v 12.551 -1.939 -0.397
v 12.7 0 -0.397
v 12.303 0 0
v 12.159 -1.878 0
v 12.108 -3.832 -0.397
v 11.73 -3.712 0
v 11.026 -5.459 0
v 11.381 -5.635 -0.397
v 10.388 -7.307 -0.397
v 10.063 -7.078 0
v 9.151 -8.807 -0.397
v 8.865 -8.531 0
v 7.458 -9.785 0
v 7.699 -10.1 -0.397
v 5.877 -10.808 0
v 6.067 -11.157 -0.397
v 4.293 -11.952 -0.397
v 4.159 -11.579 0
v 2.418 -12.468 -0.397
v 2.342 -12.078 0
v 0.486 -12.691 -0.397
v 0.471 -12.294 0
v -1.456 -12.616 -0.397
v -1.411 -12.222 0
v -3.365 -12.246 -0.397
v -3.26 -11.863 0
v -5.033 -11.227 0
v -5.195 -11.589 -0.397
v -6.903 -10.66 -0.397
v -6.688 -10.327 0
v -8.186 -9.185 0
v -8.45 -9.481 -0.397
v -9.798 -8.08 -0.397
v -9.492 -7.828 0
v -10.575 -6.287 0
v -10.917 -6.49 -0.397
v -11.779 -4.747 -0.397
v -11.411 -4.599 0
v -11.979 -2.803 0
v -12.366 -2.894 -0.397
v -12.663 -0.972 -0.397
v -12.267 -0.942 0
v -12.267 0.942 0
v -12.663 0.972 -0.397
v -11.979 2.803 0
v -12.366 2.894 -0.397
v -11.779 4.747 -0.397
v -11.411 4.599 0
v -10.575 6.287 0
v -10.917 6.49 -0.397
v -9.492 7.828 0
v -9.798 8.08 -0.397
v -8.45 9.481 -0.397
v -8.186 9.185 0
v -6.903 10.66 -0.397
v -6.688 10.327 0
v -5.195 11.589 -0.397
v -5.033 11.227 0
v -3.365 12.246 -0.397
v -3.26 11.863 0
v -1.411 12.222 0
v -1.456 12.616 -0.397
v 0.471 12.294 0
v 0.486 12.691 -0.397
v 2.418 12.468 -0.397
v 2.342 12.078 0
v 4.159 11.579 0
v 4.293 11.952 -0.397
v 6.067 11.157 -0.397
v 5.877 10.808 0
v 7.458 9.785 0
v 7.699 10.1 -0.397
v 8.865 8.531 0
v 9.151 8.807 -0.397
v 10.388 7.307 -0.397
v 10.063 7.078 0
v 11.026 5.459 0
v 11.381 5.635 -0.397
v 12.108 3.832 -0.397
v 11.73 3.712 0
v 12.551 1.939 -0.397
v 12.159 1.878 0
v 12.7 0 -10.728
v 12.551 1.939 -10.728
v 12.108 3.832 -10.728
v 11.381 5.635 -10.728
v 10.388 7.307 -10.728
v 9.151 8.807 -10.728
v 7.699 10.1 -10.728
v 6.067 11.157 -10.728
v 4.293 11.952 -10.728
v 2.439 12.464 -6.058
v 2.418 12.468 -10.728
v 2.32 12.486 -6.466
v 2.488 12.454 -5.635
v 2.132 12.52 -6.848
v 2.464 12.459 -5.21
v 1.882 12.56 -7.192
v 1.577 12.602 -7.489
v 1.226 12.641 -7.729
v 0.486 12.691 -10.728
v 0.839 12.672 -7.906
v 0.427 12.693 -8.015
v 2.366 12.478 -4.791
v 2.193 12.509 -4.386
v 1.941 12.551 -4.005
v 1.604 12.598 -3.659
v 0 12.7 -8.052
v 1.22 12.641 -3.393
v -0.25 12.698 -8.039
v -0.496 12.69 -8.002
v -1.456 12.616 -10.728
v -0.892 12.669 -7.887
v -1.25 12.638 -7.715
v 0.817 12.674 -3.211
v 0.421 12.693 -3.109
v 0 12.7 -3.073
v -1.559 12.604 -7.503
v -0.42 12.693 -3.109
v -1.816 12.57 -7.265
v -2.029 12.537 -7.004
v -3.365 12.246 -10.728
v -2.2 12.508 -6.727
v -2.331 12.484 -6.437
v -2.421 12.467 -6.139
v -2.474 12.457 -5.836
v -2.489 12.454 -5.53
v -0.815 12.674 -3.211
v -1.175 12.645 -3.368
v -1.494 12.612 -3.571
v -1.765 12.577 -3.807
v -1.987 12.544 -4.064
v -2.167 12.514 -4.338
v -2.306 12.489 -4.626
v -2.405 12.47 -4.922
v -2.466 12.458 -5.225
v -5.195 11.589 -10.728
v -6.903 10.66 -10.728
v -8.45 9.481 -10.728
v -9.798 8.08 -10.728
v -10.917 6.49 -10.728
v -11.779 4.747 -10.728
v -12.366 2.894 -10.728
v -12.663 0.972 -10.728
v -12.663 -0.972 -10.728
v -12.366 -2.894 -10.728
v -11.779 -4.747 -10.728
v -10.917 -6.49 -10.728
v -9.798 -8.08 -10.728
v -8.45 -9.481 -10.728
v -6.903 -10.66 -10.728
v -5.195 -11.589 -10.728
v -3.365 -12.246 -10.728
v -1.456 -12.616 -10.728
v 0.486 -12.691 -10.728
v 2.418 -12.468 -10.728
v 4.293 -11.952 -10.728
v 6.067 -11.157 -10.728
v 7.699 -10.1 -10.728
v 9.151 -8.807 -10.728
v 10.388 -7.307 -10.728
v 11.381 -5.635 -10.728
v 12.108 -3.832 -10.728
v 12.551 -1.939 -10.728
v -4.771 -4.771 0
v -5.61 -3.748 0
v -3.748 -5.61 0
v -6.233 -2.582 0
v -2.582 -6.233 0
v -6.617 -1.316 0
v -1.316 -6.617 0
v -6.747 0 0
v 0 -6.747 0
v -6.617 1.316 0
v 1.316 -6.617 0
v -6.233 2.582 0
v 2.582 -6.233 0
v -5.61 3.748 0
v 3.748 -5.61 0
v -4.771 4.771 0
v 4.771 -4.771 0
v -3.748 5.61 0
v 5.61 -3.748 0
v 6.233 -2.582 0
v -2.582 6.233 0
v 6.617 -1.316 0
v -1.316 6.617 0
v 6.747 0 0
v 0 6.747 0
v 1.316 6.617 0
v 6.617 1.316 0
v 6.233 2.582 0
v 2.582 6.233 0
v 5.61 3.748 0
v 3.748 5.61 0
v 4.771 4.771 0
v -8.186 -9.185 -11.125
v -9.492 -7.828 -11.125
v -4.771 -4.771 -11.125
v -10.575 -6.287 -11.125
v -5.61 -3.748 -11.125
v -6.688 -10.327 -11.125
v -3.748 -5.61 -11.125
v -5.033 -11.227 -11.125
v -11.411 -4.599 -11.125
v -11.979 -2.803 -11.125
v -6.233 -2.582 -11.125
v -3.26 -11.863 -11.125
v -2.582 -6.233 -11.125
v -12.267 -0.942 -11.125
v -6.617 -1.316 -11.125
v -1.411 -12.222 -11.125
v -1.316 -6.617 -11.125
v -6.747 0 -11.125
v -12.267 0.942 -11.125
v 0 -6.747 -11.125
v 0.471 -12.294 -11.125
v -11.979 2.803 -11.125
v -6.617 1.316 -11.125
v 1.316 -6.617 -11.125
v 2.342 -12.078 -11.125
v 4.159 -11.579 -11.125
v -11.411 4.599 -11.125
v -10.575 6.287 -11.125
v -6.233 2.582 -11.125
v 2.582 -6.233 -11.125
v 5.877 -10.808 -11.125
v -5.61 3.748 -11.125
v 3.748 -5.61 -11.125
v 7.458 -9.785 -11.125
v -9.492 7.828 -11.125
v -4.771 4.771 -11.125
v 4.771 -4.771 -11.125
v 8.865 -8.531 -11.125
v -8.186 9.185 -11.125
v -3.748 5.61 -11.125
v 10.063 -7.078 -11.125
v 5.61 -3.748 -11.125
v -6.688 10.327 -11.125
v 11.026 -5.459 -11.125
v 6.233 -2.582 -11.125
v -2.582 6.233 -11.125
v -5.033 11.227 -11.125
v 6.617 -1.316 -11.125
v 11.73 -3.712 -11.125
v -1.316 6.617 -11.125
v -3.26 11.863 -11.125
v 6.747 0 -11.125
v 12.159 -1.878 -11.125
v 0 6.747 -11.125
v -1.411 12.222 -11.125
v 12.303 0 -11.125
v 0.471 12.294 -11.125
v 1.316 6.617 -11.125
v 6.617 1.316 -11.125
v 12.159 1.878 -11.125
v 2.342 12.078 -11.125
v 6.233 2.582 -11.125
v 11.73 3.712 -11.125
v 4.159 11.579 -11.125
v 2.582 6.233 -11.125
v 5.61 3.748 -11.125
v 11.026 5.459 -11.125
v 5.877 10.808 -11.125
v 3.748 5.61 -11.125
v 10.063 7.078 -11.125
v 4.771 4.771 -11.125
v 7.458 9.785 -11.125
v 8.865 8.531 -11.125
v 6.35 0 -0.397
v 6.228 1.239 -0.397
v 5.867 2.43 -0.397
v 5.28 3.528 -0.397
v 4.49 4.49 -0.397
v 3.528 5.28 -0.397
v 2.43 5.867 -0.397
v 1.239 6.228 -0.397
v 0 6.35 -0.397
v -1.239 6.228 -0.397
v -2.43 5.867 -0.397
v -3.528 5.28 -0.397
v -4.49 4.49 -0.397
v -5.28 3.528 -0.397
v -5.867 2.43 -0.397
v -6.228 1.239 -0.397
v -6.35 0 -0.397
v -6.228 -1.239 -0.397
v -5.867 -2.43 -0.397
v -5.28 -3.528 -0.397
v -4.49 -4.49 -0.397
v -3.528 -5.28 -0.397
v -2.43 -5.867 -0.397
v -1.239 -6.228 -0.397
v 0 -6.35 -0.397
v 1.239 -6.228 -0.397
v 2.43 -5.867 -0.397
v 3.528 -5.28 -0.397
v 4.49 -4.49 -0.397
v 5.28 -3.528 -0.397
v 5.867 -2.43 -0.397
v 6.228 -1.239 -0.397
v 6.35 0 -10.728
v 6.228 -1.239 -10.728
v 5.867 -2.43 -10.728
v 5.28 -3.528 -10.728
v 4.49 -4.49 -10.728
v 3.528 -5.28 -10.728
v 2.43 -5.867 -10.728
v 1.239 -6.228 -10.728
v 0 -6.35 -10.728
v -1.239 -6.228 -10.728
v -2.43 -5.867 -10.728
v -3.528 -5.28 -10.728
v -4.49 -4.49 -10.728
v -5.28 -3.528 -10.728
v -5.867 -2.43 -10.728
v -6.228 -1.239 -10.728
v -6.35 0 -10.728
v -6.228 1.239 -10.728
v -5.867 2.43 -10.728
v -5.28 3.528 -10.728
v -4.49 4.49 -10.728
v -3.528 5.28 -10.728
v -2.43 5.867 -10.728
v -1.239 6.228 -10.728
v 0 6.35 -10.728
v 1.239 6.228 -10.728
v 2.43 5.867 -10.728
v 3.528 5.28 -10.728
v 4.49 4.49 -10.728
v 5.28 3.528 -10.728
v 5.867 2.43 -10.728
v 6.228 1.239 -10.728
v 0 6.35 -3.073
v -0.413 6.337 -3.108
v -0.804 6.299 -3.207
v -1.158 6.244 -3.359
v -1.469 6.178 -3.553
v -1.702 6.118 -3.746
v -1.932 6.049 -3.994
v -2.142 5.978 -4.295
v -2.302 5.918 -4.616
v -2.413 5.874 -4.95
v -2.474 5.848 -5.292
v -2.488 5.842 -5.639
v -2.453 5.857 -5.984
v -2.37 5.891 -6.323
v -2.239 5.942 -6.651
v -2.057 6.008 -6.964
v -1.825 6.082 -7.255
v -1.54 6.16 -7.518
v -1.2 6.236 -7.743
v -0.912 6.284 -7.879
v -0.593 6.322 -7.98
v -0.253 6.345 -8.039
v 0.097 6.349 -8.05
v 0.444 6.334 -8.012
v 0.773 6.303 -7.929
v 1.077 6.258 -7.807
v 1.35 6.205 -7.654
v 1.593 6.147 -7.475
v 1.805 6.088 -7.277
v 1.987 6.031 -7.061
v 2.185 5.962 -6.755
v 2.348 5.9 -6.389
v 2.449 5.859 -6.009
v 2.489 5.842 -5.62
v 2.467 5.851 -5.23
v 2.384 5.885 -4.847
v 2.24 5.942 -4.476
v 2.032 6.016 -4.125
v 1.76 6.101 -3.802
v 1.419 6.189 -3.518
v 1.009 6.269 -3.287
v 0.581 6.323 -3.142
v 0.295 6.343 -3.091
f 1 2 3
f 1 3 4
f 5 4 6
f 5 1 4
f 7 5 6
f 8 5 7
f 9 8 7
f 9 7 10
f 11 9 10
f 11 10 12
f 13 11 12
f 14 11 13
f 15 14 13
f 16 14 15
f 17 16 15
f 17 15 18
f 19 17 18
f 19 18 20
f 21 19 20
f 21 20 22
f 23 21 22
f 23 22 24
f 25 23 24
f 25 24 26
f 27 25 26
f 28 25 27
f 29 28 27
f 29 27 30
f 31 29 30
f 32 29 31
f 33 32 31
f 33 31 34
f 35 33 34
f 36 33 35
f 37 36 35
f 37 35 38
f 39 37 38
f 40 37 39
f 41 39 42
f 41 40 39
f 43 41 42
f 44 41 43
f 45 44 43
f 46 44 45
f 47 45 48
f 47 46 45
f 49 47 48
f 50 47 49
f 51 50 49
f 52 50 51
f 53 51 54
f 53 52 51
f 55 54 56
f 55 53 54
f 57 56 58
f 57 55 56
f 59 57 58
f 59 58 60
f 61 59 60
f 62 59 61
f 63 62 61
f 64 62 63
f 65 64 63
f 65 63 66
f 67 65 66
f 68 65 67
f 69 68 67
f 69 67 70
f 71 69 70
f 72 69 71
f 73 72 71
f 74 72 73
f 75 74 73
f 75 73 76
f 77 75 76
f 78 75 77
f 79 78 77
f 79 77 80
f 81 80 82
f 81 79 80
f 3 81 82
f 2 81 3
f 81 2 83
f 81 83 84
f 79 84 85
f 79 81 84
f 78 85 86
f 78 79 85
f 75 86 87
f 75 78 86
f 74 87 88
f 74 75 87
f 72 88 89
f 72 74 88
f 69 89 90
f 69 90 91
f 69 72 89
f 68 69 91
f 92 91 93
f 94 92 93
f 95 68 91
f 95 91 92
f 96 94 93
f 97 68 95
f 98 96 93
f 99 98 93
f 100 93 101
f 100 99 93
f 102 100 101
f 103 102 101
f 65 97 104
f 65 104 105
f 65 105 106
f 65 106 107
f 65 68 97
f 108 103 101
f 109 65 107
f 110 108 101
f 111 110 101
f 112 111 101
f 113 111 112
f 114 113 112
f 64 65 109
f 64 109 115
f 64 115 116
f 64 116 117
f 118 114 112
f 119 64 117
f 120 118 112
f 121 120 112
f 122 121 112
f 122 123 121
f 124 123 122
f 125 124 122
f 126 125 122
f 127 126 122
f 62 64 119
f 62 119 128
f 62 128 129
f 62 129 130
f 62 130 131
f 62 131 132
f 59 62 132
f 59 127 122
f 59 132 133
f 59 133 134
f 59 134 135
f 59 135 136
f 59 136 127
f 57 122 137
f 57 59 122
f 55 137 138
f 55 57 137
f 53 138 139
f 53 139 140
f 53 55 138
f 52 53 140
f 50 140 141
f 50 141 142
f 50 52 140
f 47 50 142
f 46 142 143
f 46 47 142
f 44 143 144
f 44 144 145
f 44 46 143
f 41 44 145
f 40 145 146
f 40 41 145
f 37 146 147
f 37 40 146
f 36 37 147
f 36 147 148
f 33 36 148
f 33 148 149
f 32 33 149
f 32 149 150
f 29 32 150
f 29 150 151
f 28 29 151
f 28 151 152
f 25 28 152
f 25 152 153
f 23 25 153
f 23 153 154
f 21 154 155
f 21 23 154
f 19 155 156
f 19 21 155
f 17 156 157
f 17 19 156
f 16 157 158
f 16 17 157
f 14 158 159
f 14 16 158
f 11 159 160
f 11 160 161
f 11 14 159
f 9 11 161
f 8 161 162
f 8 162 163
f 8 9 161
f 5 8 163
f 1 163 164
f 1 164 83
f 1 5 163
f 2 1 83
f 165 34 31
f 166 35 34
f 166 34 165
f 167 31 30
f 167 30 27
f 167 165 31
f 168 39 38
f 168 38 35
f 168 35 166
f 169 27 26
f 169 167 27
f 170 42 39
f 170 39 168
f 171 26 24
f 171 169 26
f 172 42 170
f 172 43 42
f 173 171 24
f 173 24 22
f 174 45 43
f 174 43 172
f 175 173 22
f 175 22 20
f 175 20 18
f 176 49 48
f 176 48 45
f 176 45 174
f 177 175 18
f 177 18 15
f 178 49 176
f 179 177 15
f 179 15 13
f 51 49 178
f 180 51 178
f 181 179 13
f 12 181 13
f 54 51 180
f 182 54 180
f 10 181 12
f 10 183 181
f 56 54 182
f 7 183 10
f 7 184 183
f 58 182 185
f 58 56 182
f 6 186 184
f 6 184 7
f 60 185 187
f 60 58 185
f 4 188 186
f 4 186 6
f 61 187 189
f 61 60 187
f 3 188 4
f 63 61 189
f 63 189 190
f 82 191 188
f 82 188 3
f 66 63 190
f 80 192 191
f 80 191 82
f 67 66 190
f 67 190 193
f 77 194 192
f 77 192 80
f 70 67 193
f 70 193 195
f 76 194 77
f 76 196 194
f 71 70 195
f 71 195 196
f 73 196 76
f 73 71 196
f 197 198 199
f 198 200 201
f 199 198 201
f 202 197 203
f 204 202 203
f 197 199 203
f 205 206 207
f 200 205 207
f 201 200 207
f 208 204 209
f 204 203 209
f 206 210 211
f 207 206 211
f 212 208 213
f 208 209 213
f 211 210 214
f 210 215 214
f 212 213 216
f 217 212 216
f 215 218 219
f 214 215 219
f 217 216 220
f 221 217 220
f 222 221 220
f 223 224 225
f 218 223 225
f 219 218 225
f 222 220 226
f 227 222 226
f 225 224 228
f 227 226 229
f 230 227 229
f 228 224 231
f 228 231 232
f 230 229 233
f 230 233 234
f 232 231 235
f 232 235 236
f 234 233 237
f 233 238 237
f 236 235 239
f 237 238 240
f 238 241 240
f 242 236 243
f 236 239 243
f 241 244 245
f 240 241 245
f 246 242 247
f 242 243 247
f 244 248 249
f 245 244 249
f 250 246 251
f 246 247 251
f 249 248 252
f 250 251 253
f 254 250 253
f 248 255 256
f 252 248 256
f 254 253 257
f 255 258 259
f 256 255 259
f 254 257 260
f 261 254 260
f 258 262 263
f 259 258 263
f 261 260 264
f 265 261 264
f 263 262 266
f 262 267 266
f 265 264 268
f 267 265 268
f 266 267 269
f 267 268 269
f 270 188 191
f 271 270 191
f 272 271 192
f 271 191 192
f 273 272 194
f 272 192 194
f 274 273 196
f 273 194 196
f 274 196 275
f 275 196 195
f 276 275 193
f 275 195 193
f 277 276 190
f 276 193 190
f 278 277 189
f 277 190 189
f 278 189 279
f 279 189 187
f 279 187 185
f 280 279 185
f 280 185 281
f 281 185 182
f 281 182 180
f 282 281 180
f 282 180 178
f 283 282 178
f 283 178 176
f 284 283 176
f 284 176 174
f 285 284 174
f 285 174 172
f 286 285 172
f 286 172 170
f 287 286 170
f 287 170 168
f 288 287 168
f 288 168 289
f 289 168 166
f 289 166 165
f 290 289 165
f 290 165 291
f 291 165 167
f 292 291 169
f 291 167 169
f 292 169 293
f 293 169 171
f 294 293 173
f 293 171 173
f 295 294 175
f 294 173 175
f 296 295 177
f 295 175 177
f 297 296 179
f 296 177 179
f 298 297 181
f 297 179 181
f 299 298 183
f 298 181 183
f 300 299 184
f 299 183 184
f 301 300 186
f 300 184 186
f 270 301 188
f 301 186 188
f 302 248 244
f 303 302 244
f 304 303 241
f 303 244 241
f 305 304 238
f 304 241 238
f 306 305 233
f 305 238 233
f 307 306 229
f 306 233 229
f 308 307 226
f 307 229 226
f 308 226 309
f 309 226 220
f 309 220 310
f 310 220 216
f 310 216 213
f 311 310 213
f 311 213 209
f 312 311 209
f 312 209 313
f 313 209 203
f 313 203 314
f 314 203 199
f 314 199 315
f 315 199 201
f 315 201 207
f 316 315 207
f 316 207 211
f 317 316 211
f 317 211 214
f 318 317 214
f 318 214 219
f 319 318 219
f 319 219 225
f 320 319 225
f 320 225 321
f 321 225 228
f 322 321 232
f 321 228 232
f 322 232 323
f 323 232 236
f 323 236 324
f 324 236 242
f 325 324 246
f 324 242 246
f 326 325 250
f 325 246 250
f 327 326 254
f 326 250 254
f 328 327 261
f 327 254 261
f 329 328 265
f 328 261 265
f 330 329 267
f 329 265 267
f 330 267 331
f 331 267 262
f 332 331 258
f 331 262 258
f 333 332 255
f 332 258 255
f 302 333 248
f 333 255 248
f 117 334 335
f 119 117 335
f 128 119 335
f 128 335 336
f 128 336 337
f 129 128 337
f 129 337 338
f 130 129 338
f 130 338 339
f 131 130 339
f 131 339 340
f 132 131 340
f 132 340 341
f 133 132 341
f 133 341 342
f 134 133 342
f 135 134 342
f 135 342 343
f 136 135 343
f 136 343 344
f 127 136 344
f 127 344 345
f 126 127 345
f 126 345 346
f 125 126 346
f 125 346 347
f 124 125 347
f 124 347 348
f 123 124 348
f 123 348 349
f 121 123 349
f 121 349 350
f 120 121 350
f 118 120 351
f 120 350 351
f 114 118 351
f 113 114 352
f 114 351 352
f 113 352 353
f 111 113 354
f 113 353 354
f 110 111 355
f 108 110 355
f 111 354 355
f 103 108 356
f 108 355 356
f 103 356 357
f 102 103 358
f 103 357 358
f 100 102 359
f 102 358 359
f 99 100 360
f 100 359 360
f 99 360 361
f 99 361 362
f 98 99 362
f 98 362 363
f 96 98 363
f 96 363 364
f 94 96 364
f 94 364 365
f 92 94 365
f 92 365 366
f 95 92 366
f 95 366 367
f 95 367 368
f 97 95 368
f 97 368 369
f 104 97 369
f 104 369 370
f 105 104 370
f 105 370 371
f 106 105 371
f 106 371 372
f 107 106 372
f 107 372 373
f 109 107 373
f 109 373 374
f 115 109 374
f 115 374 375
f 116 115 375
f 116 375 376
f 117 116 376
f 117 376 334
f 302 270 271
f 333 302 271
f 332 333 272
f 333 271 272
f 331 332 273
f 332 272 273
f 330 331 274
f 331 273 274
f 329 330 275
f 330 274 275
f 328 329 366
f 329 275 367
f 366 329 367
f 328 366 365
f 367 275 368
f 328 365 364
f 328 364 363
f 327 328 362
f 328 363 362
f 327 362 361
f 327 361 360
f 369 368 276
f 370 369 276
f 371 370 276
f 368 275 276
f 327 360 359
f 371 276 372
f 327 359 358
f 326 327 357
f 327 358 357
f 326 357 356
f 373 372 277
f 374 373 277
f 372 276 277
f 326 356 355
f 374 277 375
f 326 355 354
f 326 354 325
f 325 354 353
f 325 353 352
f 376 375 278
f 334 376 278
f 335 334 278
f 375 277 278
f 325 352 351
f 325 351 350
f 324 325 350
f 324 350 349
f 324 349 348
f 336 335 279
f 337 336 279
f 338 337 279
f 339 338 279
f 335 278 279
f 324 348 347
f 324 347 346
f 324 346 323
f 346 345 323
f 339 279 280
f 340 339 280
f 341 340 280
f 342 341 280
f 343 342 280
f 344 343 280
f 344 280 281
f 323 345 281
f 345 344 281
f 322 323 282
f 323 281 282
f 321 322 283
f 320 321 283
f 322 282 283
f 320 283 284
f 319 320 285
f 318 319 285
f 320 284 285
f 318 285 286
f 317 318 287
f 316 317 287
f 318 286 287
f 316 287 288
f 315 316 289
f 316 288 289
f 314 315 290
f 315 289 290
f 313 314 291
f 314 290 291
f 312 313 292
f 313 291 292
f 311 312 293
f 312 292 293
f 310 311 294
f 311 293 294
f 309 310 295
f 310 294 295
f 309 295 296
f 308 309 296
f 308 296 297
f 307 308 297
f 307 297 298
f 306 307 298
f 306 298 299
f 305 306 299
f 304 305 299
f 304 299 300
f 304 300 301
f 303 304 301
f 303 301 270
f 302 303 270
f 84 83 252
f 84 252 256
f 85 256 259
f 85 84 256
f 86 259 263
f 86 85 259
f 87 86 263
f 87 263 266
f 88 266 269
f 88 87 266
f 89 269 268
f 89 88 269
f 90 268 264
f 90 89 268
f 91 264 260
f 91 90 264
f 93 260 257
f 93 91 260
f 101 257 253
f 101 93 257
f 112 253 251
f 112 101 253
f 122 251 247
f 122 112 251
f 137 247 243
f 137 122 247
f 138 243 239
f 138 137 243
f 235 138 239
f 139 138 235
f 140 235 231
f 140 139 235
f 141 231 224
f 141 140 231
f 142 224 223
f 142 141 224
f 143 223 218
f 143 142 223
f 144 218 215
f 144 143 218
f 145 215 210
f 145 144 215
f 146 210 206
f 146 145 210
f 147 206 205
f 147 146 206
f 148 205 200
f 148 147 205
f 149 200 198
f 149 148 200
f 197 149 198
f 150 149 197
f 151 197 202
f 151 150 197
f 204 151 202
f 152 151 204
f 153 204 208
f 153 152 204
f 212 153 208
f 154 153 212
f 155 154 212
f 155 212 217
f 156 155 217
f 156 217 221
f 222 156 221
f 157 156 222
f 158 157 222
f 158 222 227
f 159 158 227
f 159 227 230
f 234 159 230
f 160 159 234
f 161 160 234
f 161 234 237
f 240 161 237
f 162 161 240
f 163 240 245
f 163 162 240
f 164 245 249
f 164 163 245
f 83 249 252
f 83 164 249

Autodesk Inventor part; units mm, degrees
ref_plane "YZ Plane" through (0, 0, 0) normal (1, 0, 0) x (0, 1, 0)
ref_plane "XY Plane" through (0, 0, 0) normal (0, 0, 1) x (1, 0, 0)
sketch "Sketch1" plane through (0, 0, 0) normal (0, 0, 1) x (1, 0, 0)
  circle A0 centre (0, 0) radius 12.7
  dimension "d0" = 25.4
extrude "Extrusion1" add sketch "Sketch1" against normal blind 11.1252
sketch "Sketch2" plane through (0, 0, 0) normal (0, 0, 1) x (1, 0, 0)
  circle A0 centre (0, 0) radius 12.7 projected
  circle A1 centre (0, 0) radius 6.35
  dimension "d3" = 12.7
extrude "Extrusion2" cut sketch "Sketch2" against normal up to next contours A1
chamfer "Chamfer1" distance 0.3969 angle 45 4 edges at (-12.7, 0, 0) (-12.7, 0, -11.1252) (-6.35, 0, 0) (-6.35, 0, -11.1252)
ref_plane "Work Plane1" through (0, 12.7, 0) normal (0, 1, 0) x (-1, 0, 0)
sketch "Sketch3" plane through (0, 12.7, 0) normal (0, 1, 0) x (-1, 0, 0)
  line L0 (12.3031, -11.1252) -> (-12.3031, -11.1252) projected
  line L1 (12.7, -0.3969) -> (12.7, -10.7283) projected
  point P0 (0, 0)
  point P1 (0, -5.5626)
  point P2 (0, -11.1252)
  point P3 (12.7, -5.5626)
hole "Hole1" at (0, 12.7, -5.5626) direction (0, -1, 0) diameter 4.9784 end up to surface thread size "1/4-20 UNC" class "2B" standard "ANSI Unified Screw Threads"
properties part number "SC-8-F"
